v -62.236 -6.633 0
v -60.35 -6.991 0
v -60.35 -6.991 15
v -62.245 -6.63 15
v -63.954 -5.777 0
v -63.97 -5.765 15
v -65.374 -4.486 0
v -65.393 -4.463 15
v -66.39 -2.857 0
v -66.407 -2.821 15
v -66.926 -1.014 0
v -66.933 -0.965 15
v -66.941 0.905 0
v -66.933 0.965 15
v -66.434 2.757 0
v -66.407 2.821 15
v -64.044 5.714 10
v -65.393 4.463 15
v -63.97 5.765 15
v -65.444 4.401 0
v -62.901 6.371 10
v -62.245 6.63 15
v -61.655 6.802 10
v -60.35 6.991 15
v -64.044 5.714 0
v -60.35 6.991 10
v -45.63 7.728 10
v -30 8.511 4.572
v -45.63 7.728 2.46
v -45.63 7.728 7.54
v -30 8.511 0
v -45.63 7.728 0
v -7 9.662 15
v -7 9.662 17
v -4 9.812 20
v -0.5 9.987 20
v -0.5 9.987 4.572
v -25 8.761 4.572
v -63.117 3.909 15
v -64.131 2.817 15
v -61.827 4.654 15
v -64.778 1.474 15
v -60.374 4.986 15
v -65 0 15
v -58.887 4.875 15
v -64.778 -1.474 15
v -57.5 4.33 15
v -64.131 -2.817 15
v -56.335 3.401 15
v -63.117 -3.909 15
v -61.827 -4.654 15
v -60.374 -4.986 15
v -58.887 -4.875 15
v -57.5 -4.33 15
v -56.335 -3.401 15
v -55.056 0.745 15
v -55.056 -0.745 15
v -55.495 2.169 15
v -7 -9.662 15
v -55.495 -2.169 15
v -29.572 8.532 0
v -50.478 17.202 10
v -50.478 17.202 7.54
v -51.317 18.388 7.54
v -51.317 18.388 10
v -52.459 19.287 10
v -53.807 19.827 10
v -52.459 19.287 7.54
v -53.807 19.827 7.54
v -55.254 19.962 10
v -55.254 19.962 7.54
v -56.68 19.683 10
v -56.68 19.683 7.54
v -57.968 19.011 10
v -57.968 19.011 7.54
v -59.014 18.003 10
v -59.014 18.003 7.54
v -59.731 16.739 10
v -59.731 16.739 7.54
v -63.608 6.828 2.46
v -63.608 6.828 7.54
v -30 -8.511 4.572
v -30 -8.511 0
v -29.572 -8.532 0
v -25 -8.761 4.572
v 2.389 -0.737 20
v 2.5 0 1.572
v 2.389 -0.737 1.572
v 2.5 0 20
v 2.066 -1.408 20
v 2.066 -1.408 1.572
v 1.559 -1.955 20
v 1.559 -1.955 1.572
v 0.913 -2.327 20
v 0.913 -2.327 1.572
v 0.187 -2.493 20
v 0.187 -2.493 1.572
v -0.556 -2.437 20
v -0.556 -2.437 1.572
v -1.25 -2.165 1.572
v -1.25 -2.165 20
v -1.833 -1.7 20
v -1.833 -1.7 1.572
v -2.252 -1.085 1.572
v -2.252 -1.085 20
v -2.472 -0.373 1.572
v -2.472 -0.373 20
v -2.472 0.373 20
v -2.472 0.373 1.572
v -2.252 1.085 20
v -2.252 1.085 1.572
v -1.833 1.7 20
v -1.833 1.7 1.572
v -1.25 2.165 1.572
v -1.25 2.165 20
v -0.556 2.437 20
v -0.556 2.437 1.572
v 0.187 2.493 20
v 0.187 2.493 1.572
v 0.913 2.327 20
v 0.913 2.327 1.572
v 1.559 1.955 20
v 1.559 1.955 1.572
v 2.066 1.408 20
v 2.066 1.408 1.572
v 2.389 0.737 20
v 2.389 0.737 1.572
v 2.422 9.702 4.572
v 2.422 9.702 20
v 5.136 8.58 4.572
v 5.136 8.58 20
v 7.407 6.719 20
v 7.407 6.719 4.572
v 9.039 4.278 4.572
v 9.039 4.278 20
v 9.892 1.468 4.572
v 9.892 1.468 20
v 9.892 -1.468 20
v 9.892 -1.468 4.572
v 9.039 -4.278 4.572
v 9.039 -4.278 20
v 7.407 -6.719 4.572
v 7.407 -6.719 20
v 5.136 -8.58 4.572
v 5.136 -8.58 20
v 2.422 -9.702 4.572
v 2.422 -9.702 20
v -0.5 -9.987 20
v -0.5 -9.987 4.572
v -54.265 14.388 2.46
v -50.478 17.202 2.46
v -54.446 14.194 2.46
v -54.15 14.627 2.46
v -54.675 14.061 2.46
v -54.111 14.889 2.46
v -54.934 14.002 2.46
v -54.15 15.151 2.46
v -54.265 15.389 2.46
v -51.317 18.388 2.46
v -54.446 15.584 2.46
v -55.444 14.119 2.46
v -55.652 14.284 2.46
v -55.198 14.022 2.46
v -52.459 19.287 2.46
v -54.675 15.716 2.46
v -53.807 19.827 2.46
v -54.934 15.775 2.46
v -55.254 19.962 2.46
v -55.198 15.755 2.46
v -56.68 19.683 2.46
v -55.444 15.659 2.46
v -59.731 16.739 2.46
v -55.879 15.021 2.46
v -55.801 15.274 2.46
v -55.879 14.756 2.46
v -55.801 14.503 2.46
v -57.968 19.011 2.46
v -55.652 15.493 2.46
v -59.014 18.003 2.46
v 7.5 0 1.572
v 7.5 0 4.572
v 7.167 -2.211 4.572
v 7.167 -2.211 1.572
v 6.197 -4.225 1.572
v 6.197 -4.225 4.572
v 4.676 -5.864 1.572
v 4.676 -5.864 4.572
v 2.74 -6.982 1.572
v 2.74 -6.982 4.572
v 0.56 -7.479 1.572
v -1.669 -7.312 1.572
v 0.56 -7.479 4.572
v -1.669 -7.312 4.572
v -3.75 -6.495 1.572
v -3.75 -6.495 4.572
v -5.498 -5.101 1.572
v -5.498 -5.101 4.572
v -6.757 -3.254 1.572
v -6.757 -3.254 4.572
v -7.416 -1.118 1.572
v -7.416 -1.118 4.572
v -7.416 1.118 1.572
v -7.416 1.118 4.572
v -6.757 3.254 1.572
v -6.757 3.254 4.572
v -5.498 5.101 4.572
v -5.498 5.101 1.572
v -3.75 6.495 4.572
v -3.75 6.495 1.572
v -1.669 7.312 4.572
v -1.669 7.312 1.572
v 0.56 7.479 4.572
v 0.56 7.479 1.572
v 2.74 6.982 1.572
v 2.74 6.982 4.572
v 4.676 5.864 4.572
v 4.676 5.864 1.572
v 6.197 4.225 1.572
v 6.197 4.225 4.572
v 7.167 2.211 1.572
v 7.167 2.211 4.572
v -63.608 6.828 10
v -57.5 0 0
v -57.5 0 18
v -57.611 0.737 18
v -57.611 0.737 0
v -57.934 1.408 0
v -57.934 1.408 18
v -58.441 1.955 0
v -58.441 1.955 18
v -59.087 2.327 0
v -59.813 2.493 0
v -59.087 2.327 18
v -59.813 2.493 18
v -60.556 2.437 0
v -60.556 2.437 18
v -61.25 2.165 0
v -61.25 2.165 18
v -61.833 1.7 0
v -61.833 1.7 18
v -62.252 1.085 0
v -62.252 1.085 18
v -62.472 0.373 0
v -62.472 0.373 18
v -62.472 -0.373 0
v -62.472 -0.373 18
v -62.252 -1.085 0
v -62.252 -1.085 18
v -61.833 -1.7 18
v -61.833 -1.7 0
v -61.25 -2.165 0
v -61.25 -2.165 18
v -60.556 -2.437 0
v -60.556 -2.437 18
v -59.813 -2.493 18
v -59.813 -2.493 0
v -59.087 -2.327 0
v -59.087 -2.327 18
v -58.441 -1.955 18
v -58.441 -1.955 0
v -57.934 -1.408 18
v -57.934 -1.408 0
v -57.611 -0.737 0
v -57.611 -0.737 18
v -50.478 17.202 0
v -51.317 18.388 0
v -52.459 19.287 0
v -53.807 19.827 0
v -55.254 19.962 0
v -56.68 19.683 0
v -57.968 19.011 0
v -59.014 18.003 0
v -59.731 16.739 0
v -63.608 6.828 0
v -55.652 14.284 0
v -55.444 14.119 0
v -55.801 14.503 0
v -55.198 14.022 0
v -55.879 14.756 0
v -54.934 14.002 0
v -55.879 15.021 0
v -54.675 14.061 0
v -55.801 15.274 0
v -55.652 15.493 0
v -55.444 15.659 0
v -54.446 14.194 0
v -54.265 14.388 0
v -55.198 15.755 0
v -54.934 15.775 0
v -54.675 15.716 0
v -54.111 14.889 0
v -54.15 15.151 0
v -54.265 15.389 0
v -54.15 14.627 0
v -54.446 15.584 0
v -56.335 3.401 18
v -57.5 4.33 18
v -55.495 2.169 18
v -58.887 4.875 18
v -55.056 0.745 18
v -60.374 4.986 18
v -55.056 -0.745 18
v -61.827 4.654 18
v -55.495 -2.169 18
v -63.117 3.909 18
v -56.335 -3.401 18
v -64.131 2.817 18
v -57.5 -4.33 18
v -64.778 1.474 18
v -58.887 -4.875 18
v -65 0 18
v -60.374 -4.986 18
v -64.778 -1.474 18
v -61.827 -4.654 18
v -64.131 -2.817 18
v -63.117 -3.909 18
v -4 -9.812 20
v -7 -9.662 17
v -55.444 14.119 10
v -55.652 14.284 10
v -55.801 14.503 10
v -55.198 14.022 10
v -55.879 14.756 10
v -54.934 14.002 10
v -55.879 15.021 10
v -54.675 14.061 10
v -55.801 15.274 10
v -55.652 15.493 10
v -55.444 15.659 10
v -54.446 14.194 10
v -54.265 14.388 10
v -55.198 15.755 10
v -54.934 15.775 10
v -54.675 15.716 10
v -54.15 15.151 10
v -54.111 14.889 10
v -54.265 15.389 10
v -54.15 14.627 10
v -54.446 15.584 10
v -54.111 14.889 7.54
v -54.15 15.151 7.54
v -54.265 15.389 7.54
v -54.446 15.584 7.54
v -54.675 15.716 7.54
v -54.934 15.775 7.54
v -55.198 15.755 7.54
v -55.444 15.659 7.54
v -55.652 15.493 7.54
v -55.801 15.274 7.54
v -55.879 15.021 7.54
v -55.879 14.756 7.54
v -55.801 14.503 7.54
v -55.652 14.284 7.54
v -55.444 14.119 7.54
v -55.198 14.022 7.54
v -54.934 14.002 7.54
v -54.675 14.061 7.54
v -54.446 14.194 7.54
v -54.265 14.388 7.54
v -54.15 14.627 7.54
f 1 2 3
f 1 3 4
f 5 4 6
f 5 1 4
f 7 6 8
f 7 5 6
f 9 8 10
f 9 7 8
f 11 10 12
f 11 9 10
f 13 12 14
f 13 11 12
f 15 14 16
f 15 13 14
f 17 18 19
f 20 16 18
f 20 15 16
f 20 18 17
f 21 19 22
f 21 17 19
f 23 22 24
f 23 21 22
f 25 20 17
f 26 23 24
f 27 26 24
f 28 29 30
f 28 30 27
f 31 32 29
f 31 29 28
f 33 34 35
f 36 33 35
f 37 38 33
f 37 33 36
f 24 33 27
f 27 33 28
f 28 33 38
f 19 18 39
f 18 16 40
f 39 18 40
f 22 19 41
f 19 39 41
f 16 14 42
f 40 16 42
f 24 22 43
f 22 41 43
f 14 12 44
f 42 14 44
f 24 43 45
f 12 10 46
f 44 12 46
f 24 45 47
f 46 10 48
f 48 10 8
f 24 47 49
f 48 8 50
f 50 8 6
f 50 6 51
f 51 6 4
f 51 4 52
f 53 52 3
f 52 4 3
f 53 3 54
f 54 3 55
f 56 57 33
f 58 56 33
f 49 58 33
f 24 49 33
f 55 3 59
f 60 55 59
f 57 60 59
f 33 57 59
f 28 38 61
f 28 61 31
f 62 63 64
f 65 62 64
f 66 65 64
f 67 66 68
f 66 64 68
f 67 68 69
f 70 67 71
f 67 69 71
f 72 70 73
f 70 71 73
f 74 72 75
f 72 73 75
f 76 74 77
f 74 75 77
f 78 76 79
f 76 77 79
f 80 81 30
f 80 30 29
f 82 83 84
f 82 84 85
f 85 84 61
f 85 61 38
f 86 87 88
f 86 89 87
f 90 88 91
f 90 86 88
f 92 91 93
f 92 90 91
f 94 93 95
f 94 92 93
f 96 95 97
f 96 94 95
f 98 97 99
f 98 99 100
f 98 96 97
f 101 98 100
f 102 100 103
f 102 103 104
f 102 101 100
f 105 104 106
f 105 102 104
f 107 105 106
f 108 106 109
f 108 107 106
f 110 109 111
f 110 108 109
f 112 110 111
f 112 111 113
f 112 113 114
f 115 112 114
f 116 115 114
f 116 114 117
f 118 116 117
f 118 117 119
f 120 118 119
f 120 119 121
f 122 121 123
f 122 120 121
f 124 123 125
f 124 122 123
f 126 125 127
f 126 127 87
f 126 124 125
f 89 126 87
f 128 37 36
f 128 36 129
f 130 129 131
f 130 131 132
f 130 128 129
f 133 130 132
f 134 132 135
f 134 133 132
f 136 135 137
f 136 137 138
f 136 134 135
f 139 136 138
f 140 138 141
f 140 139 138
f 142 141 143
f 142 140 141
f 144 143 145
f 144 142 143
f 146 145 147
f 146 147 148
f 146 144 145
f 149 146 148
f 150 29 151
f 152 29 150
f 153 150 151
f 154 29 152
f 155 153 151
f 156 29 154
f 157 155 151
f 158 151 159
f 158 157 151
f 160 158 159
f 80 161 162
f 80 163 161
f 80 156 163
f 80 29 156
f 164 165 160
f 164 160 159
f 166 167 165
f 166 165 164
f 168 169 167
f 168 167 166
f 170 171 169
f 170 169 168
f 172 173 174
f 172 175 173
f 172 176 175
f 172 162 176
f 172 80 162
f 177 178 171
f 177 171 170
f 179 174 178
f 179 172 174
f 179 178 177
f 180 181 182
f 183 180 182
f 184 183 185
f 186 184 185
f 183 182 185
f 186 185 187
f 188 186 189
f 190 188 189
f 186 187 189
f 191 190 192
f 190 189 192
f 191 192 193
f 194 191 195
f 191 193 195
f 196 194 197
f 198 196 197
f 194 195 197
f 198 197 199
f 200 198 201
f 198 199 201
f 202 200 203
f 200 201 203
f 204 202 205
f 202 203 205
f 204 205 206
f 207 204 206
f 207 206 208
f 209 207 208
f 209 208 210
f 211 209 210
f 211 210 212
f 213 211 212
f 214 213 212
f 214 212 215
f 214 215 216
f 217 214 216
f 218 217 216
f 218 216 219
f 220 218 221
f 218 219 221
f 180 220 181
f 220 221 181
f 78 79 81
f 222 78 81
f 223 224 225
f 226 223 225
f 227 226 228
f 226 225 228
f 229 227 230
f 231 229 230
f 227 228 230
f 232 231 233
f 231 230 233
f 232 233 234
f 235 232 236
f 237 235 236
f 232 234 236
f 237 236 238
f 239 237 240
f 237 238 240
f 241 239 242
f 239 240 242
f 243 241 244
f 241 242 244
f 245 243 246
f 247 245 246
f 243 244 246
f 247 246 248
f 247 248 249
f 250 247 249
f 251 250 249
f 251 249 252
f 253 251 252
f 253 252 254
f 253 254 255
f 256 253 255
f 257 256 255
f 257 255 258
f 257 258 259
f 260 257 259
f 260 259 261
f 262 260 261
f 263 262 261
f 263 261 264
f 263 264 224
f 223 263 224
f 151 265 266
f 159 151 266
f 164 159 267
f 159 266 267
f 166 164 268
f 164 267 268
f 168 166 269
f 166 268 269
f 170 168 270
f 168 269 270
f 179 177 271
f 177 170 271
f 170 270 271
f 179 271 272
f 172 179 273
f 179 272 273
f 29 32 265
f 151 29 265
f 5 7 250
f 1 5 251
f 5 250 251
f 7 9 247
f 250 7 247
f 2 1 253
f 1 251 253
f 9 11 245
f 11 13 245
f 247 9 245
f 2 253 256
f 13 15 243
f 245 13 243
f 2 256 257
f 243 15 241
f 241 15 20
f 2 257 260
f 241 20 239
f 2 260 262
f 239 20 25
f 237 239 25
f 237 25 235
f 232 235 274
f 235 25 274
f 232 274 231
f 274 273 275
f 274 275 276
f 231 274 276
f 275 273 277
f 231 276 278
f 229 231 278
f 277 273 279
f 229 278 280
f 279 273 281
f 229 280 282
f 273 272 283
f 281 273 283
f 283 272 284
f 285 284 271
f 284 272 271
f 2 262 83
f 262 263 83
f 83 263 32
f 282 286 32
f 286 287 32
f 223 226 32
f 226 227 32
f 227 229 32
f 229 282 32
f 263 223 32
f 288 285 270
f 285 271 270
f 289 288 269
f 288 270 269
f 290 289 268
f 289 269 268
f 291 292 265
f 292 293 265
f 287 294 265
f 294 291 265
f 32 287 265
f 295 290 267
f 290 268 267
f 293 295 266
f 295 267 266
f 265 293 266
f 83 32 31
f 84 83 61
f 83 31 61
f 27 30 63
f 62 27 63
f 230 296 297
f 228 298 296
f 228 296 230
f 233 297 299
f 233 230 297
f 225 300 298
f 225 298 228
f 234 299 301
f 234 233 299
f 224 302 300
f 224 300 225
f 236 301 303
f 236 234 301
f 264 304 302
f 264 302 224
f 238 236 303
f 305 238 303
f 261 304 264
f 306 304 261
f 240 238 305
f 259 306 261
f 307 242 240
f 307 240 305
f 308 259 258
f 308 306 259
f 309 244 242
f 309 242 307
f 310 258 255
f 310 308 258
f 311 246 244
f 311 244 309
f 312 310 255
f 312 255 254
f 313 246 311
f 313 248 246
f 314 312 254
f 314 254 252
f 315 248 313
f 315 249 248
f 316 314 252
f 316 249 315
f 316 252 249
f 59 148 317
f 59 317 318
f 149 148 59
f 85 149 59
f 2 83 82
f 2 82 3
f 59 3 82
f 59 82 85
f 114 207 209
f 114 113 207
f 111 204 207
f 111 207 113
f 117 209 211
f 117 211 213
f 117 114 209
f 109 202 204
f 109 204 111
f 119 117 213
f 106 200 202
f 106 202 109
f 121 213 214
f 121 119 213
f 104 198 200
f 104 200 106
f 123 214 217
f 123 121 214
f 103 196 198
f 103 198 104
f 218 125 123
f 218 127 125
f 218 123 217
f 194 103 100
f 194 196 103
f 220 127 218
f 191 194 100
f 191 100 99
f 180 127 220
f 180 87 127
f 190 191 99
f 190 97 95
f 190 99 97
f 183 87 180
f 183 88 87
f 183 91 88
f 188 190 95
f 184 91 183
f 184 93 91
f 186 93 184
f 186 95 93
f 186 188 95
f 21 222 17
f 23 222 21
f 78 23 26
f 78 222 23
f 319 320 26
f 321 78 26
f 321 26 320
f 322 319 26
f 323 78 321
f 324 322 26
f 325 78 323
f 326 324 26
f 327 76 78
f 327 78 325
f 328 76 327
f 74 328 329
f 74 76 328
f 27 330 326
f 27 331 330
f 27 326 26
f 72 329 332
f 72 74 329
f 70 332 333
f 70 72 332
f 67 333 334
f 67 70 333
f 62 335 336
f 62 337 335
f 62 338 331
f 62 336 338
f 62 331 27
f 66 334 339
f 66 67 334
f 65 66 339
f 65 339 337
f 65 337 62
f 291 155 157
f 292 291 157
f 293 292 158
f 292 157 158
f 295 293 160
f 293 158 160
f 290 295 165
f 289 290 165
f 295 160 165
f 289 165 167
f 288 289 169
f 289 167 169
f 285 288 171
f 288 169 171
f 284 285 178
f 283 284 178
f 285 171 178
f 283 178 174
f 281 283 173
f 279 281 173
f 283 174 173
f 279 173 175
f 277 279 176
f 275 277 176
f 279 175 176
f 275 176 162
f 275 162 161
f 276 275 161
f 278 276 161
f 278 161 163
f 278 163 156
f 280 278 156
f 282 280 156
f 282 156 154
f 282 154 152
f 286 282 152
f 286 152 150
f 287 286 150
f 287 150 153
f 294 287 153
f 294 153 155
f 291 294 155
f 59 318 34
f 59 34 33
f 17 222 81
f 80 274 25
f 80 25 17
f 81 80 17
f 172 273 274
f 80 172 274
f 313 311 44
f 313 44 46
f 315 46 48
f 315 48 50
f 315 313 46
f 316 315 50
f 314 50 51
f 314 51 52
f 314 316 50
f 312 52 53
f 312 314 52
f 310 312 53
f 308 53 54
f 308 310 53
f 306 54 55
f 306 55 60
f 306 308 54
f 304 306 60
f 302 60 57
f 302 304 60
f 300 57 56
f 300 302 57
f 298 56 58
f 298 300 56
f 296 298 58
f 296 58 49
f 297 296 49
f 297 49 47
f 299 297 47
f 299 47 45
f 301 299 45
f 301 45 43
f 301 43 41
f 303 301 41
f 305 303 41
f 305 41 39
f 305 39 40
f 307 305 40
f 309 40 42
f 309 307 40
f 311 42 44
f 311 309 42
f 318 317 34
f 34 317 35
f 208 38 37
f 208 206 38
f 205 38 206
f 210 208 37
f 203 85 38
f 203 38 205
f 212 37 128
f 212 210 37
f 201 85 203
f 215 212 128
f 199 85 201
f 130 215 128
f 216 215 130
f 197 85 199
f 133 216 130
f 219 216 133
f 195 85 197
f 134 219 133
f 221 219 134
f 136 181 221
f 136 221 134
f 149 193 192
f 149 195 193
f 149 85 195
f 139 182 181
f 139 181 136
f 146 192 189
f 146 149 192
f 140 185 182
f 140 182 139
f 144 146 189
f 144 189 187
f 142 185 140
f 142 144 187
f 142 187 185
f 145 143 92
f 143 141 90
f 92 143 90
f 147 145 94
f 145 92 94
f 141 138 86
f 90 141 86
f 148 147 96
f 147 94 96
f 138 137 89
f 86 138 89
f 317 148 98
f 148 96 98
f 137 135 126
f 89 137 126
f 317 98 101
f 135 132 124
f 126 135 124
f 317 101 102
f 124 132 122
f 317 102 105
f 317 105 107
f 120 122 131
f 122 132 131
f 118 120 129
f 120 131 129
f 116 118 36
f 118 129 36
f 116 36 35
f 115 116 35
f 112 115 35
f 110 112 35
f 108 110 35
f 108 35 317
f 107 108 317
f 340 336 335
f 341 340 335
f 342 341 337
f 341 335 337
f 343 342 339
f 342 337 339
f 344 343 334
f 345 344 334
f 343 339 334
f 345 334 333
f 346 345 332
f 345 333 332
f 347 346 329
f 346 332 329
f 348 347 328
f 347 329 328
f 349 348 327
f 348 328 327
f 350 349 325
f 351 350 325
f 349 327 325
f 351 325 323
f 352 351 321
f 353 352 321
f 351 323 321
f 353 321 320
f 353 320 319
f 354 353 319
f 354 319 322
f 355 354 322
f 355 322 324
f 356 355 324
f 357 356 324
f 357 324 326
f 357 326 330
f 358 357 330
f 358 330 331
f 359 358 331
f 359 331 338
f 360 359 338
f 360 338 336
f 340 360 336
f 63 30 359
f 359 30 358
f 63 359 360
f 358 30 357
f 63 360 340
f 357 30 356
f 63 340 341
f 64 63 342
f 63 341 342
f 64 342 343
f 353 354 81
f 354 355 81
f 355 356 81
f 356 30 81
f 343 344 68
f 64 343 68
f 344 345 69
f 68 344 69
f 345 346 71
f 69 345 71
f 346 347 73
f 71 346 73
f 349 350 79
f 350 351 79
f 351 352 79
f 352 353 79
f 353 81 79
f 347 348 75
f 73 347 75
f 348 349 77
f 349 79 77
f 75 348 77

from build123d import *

# Parameters (mm, degrees)
BOSS_EXTRUDE1_DEPTH     = 20
SKETCH2_R               = 2.5
CUT_EXTRUDE1_DEPTH      = 71.632853546
BOSS_EXTRUDE4_DEPTH     = 10
CUT_EXTRUDE2_DEPTH      = 80.703956491
CUT_EXTRUDE2_DEPTH_BACK = 80.703956491
SKETCH6_W               = 5.08
SKETCH6_H               = 17.7
SKETCH7_R               = 0.889
CUT_EXTRUDE3_DEPTH      = 73.716888558
CUT_EXTRUDE4_DEPTH      = 73.716888558
CUT_EXTRUDE4_DEPTH_BACK = 73.716888558
SKETCH8_W               = 40
SKETCH8_H               = 4.572
SKETCH8_W_2             = 60
SKETCH8_H_2             = 5
SKETCH4_R               = 7.5
SKETCH4_R_2             = 2.5
BOSS_EXTRUDE3_DEPTH     = 3
CHAMFER1_SIZE           = 5
BOSS_EXTRUDE2_START     = 3
SKETCH3_R               = 5
SKETCH3_R_2             = 2.5
BOSS_EXTRUDE2_DEPTH     = 3
CHAMFER2_SIZE           = 3


with BuildPart() as part:
    # Sketch1 → Boss-Extrude1 (new body)
    with BuildSketch(Plane.XY):
        with BuildLine():
            Line((-60.35, 6.991244524), (-0.5, 9.987492178))
            ThreePointArc((-0.5, 9.987492178), (10, 0), (-0.5, -9.987492178))
            Line((-0.5, -9.987492178), (-60.35, -6.991244524))
            ThreePointArc((-60.35, -6.991244524), (-67, 0), (-60.35, 6.991244524))
        make_face()
    extrude(amount=BOSS_EXTRUDE1_DEPTH)

    # Sketch2 → Cut-Extrude1 (cut, through all)
    with BuildSketch(Plane.XY.offset(20)):
        with Locations((-60, 0)):
            Circle(SKETCH2_R)
        Circle(SKETCH2_R)
    extrude(amount=-CUT_EXTRUDE1_DEPTH, mode=Mode.SUBTRACT)

    # Sketch5 → Boss-Extrude4 (add)
    with BuildSketch(Plane.XY):
        with BuildLine():
            Line((-60.35, 6.991244524), (-45.63025704, 7.728153385))
            Line((-45.63025704, 7.728153385), (-50.477534128, 17.202429338))
            ThreePointArc((-50.477534128, 17.202429338), (-55.254, 19.962268451), (-59.730944827, 16.739179378))
            Line((-59.730944827, 16.739179378), (-63.60774296, 6.828153385))
            Line((-63.60774296, 6.828153385), (-64.043561758, 5.713983576))
            ThreePointArc((-64.043561758, 5.713983576), (-62.287727062, 6.615610697), (-60.35, 6.991244524))
        make_face()
    extrude(amount=BOSS_EXTRUDE4_DEPTH)

    # Sketch6 → Cut-Extrude2 (cut, two sides: drawn at the far end of the back side and taken through both)
    with BuildSketch(Plane(origin=(-63.598111022, -3.183887901, 0), x_dir=(0, 0, -1), z_dir=(0.9987492177719091, 0.05000000000000006, -2.8501484999108014e-15)).offset(-CUT_EXTRUDE2_DEPTH_BACK)):
        with Locations((-5, 18.85)):
            Rectangle(SKETCH6_W, SKETCH6_H)
    extrude(amount=CUT_EXTRUDE2_DEPTH + CUT_EXTRUDE2_DEPTH_BACK, mode=Mode.SUBTRACT)

    # Sketch7 → Cut-Extrude3 (cut, through all)
    with BuildSketch(Plane.XY.offset(20)):
        with Locations((-55, 14.888622424)):
            Circle(SKETCH7_R)
    extrude(amount=-CUT_EXTRUDE3_DEPTH, mode=Mode.SUBTRACT)

    # Sketch8 → Cut-Extrude4 (cut, two sides: drawn at the far end of the back side and taken through both)
    with BuildSketch(Plane(origin=(0, 0, 0), x_dir=(1, 0, 0), z_dir=(0, 1, 0)).offset(-CUT_EXTRUDE4_DEPTH_BACK)):
        with Locations((-10, -2.286)):
            Rectangle(SKETCH8_W, SKETCH8_H)
        with Locations((-37, -17.5)):
            Rectangle(SKETCH8_W_2, SKETCH8_H_2)
    extrude(amount=CUT_EXTRUDE4_DEPTH + CUT_EXTRUDE4_DEPTH_BACK, mode=Mode.SUBTRACT)

    # Sketch4 → Boss-Extrude3 (add)
    with BuildSketch(Plane(origin=(0, 0, 4.572), x_dir=(-1, 0, 0), z_dir=(0, 0, -1))):
        with Locations(Location((0, 0, 0), (0, 0, 180))):
            Circle(SKETCH4_R)
        with Locations(Location((0, 0, 0), (0, 0, 180))):
            Circle(SKETCH4_R_2, mode=Mode.SUBTRACT)
    extrude(amount=BOSS_EXTRUDE3_DEPTH)

    # Chamfer1
    # the kernel refuses this chamfer: 5 mm, written as the material it adds along each edge
    with BuildSketch(Plane(origin=(-30, -21.369059903, 4.572), x_dir=(-0.027495876610586317, 0, -0.9996219169112968), z_dir=(0, 1, 0))) as chamfer1_piece_1_section:
        Polygon((CHAMFER1_SIZE * 0.999621916911, -CHAMFER1_SIZE * 0.0274958766106), (-CHAMFER1_SIZE * 0.0274958766106, -CHAMFER1_SIZE * 0.999621916911), (0, 0), align=None)
    chamfer1_piece_1 = extrude(amount=42.738119807, mode=Mode.PRIVATE)
    chamfer1_piece_1 = split(chamfer1_piece_1, bisect_by=Plane(origin=(-28.745975843, 8.573424695, 2.975382292), z_dir=(0.050000000000000065, -0.998749217771909, 0)), keep=Keep.TOP, mode=Mode.PRIVATE)
    chamfer1_piece_1 = split(chamfer1_piece_1, bisect_by=Plane(origin=(-28.316767762, 0, 0), z_dir=(0, 0, 1)), keep=Keep.TOP, mode=Mode.PRIVATE)
    chamfer1_piece_1 = split(chamfer1_piece_1, bisect_by=Plane(origin=(-28.745975843, -8.573424695, 2.975382292), z_dir=(0.05000000000000006, 0.998749217771909, 0)), keep=Keep.TOP, mode=Mode.PRIVATE)
    add(chamfer1_piece_1)

    # Sketch3 → Boss-Extrude2 (add)
    with BuildSketch(Plane.XY.offset(15).offset(BOSS_EXTRUDE2_START)):
        with Locations(Location((-60, 0, 0), (0, 0, 180))):
            Circle(SKETCH3_R)
        with Locations((-60, 0)):
            Circle(SKETCH3_R_2, mode=Mode.SUBTRACT)
    extrude(amount=-BOSS_EXTRUDE2_DEPTH)

    # Chamfer2
    chamfer2_edges = [part.edges().sort_by_distance(p)[0] for p in [
        (-7, 0, 20),
    ]]
    chamfer(chamfer2_edges, length=CHAMFER2_SIZE)


solid = part.part
